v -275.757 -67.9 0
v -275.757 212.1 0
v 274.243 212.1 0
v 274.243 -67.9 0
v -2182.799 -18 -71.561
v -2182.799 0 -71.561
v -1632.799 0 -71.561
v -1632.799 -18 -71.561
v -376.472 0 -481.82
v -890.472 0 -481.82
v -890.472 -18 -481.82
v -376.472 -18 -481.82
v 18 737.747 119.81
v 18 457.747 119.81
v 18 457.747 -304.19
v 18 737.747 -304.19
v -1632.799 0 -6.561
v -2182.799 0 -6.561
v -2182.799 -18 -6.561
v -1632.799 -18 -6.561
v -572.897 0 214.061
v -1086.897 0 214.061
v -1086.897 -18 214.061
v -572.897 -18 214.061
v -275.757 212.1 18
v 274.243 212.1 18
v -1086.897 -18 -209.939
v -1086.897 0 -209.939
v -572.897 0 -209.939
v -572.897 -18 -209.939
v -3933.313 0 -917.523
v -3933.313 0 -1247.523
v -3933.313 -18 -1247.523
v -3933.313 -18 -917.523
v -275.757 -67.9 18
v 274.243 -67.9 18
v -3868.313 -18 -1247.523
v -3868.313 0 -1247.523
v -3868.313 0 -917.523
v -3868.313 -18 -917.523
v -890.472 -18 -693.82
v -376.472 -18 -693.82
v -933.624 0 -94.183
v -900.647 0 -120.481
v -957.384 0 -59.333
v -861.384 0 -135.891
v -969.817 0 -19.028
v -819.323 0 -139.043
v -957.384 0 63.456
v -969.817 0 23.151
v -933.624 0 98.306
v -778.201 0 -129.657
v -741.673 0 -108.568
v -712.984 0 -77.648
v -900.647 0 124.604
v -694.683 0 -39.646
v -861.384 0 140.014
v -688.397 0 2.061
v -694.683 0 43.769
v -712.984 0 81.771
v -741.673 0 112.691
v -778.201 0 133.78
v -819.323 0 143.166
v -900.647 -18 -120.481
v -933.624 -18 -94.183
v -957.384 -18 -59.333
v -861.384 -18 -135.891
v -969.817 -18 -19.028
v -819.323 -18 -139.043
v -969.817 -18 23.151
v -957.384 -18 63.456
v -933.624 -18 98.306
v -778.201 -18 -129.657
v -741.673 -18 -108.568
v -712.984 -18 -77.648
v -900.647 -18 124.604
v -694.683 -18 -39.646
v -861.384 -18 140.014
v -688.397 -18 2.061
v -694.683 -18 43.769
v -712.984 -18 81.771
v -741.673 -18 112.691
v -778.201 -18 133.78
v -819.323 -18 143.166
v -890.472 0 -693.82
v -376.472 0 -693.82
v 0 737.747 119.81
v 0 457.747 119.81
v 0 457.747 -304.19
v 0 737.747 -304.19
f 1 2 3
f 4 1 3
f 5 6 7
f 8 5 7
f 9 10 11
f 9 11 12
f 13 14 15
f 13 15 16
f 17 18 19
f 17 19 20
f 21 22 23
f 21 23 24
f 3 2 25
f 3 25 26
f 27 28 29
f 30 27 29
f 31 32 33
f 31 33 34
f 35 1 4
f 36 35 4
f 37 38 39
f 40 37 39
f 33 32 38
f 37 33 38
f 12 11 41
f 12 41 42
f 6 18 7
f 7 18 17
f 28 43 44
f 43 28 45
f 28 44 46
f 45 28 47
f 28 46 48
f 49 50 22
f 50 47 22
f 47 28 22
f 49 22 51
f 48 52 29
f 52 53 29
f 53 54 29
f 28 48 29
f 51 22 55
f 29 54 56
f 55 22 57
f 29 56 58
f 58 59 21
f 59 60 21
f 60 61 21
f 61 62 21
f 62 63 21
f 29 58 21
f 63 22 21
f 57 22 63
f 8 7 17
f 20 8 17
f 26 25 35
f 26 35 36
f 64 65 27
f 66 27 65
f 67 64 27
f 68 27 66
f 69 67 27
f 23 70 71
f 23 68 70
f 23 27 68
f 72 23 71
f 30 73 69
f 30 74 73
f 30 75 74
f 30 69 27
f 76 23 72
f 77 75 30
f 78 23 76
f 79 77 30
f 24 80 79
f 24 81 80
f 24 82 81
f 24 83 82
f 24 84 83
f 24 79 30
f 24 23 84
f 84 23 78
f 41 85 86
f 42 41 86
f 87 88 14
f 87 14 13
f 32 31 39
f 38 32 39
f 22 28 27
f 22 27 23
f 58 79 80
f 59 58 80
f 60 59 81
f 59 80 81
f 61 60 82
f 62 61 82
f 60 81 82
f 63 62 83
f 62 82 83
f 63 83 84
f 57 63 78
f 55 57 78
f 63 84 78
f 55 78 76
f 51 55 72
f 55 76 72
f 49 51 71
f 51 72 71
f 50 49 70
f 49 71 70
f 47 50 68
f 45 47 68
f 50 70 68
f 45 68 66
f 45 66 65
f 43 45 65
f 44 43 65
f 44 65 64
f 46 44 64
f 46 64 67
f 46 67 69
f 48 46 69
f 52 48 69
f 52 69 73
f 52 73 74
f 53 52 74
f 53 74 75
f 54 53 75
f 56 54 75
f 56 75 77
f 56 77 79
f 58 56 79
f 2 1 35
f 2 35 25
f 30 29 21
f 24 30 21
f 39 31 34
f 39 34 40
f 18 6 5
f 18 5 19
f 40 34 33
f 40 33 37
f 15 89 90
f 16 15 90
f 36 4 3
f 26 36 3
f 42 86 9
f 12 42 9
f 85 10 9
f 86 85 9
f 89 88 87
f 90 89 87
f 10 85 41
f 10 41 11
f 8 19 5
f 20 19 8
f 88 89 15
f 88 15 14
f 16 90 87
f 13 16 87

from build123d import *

# Parameters (mm, degrees)
F0_W      = 550
F0_H      = 280
F1_DEPTH  = 18
F2_W      = 280
F2_H      = 424
F3_DEPTH  = 18
F4_W      = 514
F4_H      = 424
F5_DEPTH  = 18
F6_R      = 141.5
F7_DEPTH  = 755.747566
F8_W      = 514
F8_H      = 212
F9_DEPTH  = 18
F10_W     = 550
F10_H     = 65
F11_DEPTH = 18
F12_W     = 65
F12_H     = 330
F13_DEPTH = 18


with BuildPart() as f1:
    # F0 (on Top) → F1 (new body)
    with BuildSketch(Plane.XY):
        with Locations((-0.756867, 72.099509)):
            Rectangle(F0_W, F0_H)
    extrude(amount=F1_DEPTH)


with BuildPart() as f3:
    # F2 (on Right) → F3 (new body)
    with BuildSketch(Plane.YZ):
        with Locations((597.746566, -92.18962)):
            Rectangle(F2_W, F2_H)
    extrude(amount=F3_DEPTH)


with BuildPart() as f5:
    # F4 (on Front) → F5 (new body)
    with BuildSketch(Plane.XZ):
        with Locations((-829.896957, 2.061453)):
            Rectangle(F4_W, F4_H)
    extrude(amount=F5_DEPTH)

    # F6 (on face) → F7 (cut, through all)
    with BuildSketch(Plane.XZ.offset(18)):
        with Locations((-829.896957, 2.061453)):
            Circle(F6_R)
    extrude(amount=-F7_DEPTH, mode=Mode.SUBTRACT)


with BuildPart() as f9:
    # F8 (on Front) → F9 (new body)
    with BuildSketch(Plane.XZ):
        with Locations((-633.472204, -587.819855)):
            Rectangle(F8_W, F8_H)
    extrude(amount=F9_DEPTH)


with BuildPart() as f11:
    # F10 (on Front) → F11 (new body)
    with BuildSketch(Plane.XZ):
        with Locations((-1907.799184, -39.061294)):
            Rectangle(F10_W, F10_H)
    extrude(amount=F11_DEPTH)


with BuildPart() as f13:
    # F12 (on Front) → F13 (new body)
    with BuildSketch(Plane.XZ):
        with Locations((-3900.813289, -1082.523244)):
            Rectangle(F12_W, F12_H)
    extrude(amount=F13_DEPTH)


solid = Compound([f1.part, f3.part, f5.part, f9.part, f11.part, f13.part])
